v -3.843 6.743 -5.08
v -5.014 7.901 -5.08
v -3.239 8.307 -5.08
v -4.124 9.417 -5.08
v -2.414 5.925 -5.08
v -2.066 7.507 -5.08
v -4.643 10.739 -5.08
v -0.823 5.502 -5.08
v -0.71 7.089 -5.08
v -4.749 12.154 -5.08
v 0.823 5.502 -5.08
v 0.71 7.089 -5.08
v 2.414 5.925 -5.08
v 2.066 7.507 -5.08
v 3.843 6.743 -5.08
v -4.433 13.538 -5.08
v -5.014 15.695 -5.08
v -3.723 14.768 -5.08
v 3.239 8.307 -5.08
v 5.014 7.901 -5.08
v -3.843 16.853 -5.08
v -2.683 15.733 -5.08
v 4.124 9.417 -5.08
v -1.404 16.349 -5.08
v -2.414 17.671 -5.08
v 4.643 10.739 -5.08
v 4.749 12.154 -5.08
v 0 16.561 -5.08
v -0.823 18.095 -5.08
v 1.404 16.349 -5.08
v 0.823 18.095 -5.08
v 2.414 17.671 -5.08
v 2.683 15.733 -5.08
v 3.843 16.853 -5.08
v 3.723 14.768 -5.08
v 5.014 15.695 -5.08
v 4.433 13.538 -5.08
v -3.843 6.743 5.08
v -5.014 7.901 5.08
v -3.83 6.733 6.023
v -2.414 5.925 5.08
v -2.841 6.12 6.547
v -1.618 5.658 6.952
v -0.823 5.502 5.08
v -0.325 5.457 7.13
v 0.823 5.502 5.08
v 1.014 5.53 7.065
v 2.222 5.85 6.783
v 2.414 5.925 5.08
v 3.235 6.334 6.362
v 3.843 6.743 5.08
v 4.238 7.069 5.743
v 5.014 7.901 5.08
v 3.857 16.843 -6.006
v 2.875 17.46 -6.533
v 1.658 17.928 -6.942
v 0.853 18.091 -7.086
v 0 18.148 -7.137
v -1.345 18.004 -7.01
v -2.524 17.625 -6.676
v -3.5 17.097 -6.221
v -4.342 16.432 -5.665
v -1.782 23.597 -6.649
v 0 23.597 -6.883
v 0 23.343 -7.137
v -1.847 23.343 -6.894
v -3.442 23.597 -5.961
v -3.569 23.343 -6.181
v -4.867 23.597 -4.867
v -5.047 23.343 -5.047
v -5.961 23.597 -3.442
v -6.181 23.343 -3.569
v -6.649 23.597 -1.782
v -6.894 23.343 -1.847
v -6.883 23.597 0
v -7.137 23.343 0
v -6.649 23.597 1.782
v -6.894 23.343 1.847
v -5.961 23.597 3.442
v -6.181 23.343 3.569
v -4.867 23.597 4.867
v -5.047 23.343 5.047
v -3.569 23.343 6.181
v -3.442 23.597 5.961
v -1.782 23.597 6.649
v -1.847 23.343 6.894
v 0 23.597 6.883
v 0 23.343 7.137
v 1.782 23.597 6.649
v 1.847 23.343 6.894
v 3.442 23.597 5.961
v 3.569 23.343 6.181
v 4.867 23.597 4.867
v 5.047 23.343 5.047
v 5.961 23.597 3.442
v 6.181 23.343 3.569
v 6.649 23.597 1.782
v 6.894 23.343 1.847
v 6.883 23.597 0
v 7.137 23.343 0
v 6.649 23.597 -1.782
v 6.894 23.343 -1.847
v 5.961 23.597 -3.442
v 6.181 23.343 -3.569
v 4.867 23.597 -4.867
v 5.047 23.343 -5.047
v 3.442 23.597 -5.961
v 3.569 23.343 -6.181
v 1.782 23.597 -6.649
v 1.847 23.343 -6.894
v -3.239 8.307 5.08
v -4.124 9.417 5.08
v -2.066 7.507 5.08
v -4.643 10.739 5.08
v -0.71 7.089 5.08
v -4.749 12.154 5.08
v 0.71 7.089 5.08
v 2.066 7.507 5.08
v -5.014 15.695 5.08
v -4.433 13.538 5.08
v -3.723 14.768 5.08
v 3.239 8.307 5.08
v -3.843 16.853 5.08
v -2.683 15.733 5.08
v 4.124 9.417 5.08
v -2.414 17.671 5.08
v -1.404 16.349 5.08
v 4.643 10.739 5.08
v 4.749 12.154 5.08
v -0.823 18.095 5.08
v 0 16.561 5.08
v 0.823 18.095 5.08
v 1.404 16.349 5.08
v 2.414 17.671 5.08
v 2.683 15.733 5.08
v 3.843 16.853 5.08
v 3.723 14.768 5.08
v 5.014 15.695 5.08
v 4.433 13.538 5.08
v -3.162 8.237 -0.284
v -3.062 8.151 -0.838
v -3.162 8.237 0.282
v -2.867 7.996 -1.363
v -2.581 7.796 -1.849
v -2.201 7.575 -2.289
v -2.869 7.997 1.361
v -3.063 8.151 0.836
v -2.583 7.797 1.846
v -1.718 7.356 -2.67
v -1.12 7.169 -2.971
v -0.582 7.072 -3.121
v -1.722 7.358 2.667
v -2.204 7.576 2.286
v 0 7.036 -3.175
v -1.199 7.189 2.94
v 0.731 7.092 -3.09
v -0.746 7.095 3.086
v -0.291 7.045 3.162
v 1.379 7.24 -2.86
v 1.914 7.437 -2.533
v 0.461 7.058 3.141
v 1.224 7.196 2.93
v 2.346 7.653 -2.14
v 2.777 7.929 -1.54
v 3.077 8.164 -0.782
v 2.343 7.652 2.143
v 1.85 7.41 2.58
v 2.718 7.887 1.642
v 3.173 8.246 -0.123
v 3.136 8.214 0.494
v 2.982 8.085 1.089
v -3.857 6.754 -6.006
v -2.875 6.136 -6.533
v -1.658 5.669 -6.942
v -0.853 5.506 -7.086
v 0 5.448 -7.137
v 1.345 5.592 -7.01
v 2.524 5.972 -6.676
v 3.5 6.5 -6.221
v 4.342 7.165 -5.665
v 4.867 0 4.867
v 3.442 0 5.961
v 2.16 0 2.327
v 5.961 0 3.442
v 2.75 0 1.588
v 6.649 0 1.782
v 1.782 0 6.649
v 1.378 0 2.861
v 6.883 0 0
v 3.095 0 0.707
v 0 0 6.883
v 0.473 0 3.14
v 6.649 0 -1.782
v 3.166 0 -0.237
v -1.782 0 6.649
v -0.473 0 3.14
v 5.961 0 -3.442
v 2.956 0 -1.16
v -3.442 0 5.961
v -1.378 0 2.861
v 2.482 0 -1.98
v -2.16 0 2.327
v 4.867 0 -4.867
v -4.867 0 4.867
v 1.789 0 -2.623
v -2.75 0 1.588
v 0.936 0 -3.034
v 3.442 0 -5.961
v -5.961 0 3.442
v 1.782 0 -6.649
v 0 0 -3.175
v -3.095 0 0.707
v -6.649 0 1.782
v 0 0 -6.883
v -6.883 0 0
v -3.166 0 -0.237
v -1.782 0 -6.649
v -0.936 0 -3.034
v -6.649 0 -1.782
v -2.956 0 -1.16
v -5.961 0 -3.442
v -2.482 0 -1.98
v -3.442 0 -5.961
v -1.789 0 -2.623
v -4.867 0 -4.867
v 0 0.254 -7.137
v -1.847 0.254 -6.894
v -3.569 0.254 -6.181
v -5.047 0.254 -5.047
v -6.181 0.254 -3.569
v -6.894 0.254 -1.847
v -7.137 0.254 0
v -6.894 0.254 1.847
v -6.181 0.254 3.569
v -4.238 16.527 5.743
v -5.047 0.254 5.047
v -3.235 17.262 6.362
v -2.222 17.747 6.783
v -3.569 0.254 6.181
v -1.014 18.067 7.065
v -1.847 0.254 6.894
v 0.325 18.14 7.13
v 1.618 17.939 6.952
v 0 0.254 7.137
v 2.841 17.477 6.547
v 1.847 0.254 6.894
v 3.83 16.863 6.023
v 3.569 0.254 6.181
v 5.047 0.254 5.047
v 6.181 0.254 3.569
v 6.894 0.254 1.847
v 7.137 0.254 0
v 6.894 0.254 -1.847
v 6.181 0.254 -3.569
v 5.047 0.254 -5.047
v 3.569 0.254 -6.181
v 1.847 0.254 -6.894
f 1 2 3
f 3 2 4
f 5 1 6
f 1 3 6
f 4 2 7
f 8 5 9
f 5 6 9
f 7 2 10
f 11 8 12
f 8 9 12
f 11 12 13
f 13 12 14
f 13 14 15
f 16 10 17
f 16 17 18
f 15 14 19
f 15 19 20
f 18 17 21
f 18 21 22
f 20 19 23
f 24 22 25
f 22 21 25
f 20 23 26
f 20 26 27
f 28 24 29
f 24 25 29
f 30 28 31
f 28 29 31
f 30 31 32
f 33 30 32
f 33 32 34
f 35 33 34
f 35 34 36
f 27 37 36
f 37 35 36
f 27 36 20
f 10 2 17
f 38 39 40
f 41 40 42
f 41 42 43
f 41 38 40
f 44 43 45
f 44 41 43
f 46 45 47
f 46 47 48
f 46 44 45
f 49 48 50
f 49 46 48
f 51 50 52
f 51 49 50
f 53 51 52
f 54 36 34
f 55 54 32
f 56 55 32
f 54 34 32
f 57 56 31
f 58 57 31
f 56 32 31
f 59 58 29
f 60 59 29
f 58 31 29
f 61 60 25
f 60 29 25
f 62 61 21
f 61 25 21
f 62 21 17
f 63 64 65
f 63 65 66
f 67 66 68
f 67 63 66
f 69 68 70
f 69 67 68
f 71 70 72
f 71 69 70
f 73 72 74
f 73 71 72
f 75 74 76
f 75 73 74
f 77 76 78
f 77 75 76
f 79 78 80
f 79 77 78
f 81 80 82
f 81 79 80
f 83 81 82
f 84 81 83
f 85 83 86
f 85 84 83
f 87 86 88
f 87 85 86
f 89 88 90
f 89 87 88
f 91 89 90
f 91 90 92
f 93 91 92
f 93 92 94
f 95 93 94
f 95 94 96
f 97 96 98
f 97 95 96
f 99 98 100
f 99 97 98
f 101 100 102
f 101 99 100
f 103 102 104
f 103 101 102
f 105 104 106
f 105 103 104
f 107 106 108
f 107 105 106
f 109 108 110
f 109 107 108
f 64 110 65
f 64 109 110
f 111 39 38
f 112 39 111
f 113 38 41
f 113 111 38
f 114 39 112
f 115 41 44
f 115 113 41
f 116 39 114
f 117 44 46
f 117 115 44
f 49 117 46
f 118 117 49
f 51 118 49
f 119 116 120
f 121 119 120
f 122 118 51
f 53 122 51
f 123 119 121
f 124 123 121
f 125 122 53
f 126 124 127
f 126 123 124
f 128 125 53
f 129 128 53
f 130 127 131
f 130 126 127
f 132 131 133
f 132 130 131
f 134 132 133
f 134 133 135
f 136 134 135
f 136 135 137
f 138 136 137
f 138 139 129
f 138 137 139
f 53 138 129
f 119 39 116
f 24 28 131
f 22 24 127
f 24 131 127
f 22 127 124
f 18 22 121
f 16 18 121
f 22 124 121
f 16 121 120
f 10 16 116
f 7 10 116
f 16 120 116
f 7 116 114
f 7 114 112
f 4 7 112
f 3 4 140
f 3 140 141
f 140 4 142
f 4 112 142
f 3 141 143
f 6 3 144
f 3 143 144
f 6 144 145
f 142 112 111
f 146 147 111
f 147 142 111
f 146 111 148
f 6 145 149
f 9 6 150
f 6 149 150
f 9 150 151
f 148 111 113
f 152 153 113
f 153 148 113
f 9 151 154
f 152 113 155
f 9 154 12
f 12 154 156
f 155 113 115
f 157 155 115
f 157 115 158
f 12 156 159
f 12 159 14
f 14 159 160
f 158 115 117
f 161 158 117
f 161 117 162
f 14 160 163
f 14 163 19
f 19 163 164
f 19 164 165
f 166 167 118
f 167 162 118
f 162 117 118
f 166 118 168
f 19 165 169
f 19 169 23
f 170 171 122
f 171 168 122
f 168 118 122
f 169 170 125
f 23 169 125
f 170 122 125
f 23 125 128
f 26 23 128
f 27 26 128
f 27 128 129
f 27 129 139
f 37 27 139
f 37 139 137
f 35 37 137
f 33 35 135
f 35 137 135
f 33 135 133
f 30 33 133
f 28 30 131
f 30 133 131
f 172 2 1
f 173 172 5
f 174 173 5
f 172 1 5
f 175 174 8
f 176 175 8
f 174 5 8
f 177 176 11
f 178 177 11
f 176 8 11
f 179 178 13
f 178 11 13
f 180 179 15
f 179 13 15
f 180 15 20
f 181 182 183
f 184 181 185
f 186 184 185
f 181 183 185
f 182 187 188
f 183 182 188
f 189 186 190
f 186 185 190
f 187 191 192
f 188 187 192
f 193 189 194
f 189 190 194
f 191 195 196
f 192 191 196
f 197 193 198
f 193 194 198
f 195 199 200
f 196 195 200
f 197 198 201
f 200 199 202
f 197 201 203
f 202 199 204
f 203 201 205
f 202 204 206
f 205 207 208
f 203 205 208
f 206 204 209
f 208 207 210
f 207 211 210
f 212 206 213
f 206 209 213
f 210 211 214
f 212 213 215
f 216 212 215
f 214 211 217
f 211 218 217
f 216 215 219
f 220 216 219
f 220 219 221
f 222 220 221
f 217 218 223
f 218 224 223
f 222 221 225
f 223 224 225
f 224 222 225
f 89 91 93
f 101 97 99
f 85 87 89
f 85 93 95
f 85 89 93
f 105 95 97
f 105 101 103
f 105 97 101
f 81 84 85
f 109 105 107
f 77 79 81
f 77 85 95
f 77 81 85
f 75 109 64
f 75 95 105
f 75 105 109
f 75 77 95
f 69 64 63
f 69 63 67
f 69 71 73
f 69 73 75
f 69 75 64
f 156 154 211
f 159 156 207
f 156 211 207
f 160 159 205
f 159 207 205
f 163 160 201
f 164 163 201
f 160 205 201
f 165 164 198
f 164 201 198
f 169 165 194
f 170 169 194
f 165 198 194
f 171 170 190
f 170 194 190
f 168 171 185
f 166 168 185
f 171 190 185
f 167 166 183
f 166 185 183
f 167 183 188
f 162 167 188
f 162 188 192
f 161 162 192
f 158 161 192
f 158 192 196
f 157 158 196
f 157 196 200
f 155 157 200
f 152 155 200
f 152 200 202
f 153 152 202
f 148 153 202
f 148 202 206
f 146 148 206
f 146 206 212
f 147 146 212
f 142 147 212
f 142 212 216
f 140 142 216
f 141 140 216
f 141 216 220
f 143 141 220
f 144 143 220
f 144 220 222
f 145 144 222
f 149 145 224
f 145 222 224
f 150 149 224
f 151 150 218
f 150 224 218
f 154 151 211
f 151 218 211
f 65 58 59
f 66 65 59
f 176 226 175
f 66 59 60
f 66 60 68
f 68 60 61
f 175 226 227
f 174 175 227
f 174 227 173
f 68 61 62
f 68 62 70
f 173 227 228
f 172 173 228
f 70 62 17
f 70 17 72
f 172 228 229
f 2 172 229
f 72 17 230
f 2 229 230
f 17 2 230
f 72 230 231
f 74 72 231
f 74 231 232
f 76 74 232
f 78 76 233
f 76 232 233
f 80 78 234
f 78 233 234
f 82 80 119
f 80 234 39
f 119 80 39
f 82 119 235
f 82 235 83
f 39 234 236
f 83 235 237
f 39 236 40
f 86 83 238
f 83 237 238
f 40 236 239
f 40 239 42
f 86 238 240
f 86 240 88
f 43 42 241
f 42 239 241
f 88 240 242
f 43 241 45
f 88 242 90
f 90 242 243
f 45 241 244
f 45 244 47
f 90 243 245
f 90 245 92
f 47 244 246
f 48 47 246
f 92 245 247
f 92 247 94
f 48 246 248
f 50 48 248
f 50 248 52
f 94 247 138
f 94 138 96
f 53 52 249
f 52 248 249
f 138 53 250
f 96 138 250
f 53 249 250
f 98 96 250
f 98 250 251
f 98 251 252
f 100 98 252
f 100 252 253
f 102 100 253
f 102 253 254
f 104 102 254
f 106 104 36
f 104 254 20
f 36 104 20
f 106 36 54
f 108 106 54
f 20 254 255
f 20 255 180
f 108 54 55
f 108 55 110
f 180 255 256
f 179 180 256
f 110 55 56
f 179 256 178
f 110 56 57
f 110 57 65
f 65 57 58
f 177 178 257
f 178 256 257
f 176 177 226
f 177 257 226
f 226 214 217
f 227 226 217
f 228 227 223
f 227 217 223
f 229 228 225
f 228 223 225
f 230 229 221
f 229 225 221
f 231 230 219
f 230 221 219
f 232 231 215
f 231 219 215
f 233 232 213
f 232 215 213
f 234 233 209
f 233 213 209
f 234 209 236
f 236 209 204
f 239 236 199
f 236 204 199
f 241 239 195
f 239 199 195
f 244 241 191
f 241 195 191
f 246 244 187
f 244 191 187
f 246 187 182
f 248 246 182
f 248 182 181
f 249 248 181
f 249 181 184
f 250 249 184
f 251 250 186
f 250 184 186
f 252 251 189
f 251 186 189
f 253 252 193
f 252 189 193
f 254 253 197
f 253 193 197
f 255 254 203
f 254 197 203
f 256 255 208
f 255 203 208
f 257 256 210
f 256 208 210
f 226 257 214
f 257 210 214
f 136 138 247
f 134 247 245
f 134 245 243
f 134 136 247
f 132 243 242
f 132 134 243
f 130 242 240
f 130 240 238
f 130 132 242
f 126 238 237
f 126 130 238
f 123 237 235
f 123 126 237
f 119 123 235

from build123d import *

# Parameters (mm, degrees)
SKETCH1_R               = 7.1374
BOSS_EXTRUDE1_DEPTH     = 23.5966
CHAMFER1_SIZE           = 0.254
CHAMFER2_SIZE           = 0.254
SKETCH2_R               = 4.7625
CUT_EXTRUDE1_DEPTH      = 7.1755
SKETCH3_R               = 6.35
CUT_EXTRUDE2_DEPTH      = 28.513757958
CUT_EXTRUDE3_REACH      = 27.665
CUT_EXTRUDE3_END_RADIUS = 4.7625
SKETCH4_R               = 3.175


with BuildPart() as part:
    # Sketch1 → Boss-Extrude1 (new body)
    with BuildSketch(Plane(origin=(0, 0, 0), x_dir=(1, 0, 0), z_dir=(0, 1, 0))):
        with Locations(Location((0, 0, 0), (0, 0, 90))):
            Circle(SKETCH1_R)
    extrude(amount=BOSS_EXTRUDE1_DEPTH)

    # Chamfer1
    chamfer1_edges = [part.edges().sort_by_distance(p)[0] for p in [
        (0, 0, 7.1374),
    ]]
    chamfer(chamfer1_edges, length=CHAMFER1_SIZE)

    # Chamfer2
    chamfer2_edges = [part.edges().sort_by_distance(p)[0] for p in [
        (0, 23.5966, 7.1374),
    ]]
    chamfer(chamfer2_edges, length=CHAMFER2_SIZE)

    # Sketch2 → Cut-Extrude1 (cut, symmetric)
    with BuildSketch(Plane.XY):
        with Locations(Location((0, 11.7983, 0), (0, 0, 89.999999998))):
            Circle(SKETCH2_R)
    extrude(amount=CUT_EXTRUDE1_DEPTH, both=True, mode=Mode.SUBTRACT)

    # Sketch3 → Cut-Extrude2 (cut, through all)
    with BuildSketch(Plane.XY.offset(5.08)):
        with Locations((0, 11.7983)):
            Circle(SKETCH3_R)
    cut_extrude2 = extrude(amount=CUT_EXTRUDE2_DEPTH, mode=Mode.SUBTRACT)

    # Mirror1: Cut-Extrude2 across plane
    add(cut_extrude2.mirror(Plane.XY), mode=Mode.SUBTRACT)

    # Cut-Extrude3: up to this cylinder (the profile starts outside it)
    cut_extrude3_end = Plane(origin=(0, 11.7983, 0), z_dir=(0, 0, 1)) * Cylinder(CUT_EXTRUDE3_END_RADIUS, 65.855, mode=Mode.PRIVATE)
    # Sketch4 → Cut-Extrude3 (cut, up to the surface)
    with BuildSketch(Plane.XZ, mode=Mode.PRIVATE) as cut_extrude3_sk1:
        with Locations(Location((0, 0, 0), (0, 0, 270))):
            Circle(SKETCH4_R)
    cut_extrude3_tool1 = extrude(cut_extrude3_sk1.sketch, amount=-CUT_EXTRUDE3_REACH, mode=Mode.PRIVATE) - cut_extrude3_end
    add(cut_extrude3_tool1.solids().sort_by_distance((0, 0, 0))[0], mode=Mode.SUBTRACT)


solid = part.part
